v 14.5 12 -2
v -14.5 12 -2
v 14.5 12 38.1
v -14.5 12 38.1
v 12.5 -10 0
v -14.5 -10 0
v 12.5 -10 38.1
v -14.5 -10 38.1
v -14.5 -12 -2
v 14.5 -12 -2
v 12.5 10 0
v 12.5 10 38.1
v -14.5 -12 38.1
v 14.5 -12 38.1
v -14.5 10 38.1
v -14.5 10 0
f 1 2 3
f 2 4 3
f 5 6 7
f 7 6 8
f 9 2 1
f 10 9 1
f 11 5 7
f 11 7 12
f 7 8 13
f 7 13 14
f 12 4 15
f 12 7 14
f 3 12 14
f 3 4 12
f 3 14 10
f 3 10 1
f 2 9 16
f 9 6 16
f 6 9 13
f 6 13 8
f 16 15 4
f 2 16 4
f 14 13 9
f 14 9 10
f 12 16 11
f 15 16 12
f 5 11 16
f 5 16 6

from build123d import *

# Parameters (mm, degrees)
F0_W     = 29
F0_H     = 24
F0_W_2   = 25
F0_H_2   = 20
F1_DEPTH = 38.1
F2_DEPTH = 2
F3_W     = 20
F3_H     = 38.1
F4_DEPTH = 2


with BuildPart() as f1:
    # F0 (on Top) → F1 (new body)
    with BuildSketch(Plane.XY):
        Rectangle(F0_W, F0_H)
        Rectangle(F0_W_2, F0_H_2, mode=Mode.SUBTRACT)
    extrude(amount=F1_DEPTH)

    # F0 (on Top) → F2 (join)
    with BuildSketch(Plane.XY):
        Rectangle(F0_W, F0_H)
        Rectangle(F0_W_2, F0_H_2, mode=Mode.SUBTRACT)
        Rectangle(F0_W_2, F0_H_2)
    extrude(amount=-F2_DEPTH)

    # F3 (on face) → F4 (cut)
    with BuildSketch(Plane(origin=(-14.5, 0, 0), x_dir=(0, -1, 0), z_dir=(-1, 0, 0))):
        with Locations((0, 19.05)):
            Rectangle(F3_W, F3_H)
    extrude(amount=-F4_DEPTH, mode=Mode.SUBTRACT)


solid = f1.part
